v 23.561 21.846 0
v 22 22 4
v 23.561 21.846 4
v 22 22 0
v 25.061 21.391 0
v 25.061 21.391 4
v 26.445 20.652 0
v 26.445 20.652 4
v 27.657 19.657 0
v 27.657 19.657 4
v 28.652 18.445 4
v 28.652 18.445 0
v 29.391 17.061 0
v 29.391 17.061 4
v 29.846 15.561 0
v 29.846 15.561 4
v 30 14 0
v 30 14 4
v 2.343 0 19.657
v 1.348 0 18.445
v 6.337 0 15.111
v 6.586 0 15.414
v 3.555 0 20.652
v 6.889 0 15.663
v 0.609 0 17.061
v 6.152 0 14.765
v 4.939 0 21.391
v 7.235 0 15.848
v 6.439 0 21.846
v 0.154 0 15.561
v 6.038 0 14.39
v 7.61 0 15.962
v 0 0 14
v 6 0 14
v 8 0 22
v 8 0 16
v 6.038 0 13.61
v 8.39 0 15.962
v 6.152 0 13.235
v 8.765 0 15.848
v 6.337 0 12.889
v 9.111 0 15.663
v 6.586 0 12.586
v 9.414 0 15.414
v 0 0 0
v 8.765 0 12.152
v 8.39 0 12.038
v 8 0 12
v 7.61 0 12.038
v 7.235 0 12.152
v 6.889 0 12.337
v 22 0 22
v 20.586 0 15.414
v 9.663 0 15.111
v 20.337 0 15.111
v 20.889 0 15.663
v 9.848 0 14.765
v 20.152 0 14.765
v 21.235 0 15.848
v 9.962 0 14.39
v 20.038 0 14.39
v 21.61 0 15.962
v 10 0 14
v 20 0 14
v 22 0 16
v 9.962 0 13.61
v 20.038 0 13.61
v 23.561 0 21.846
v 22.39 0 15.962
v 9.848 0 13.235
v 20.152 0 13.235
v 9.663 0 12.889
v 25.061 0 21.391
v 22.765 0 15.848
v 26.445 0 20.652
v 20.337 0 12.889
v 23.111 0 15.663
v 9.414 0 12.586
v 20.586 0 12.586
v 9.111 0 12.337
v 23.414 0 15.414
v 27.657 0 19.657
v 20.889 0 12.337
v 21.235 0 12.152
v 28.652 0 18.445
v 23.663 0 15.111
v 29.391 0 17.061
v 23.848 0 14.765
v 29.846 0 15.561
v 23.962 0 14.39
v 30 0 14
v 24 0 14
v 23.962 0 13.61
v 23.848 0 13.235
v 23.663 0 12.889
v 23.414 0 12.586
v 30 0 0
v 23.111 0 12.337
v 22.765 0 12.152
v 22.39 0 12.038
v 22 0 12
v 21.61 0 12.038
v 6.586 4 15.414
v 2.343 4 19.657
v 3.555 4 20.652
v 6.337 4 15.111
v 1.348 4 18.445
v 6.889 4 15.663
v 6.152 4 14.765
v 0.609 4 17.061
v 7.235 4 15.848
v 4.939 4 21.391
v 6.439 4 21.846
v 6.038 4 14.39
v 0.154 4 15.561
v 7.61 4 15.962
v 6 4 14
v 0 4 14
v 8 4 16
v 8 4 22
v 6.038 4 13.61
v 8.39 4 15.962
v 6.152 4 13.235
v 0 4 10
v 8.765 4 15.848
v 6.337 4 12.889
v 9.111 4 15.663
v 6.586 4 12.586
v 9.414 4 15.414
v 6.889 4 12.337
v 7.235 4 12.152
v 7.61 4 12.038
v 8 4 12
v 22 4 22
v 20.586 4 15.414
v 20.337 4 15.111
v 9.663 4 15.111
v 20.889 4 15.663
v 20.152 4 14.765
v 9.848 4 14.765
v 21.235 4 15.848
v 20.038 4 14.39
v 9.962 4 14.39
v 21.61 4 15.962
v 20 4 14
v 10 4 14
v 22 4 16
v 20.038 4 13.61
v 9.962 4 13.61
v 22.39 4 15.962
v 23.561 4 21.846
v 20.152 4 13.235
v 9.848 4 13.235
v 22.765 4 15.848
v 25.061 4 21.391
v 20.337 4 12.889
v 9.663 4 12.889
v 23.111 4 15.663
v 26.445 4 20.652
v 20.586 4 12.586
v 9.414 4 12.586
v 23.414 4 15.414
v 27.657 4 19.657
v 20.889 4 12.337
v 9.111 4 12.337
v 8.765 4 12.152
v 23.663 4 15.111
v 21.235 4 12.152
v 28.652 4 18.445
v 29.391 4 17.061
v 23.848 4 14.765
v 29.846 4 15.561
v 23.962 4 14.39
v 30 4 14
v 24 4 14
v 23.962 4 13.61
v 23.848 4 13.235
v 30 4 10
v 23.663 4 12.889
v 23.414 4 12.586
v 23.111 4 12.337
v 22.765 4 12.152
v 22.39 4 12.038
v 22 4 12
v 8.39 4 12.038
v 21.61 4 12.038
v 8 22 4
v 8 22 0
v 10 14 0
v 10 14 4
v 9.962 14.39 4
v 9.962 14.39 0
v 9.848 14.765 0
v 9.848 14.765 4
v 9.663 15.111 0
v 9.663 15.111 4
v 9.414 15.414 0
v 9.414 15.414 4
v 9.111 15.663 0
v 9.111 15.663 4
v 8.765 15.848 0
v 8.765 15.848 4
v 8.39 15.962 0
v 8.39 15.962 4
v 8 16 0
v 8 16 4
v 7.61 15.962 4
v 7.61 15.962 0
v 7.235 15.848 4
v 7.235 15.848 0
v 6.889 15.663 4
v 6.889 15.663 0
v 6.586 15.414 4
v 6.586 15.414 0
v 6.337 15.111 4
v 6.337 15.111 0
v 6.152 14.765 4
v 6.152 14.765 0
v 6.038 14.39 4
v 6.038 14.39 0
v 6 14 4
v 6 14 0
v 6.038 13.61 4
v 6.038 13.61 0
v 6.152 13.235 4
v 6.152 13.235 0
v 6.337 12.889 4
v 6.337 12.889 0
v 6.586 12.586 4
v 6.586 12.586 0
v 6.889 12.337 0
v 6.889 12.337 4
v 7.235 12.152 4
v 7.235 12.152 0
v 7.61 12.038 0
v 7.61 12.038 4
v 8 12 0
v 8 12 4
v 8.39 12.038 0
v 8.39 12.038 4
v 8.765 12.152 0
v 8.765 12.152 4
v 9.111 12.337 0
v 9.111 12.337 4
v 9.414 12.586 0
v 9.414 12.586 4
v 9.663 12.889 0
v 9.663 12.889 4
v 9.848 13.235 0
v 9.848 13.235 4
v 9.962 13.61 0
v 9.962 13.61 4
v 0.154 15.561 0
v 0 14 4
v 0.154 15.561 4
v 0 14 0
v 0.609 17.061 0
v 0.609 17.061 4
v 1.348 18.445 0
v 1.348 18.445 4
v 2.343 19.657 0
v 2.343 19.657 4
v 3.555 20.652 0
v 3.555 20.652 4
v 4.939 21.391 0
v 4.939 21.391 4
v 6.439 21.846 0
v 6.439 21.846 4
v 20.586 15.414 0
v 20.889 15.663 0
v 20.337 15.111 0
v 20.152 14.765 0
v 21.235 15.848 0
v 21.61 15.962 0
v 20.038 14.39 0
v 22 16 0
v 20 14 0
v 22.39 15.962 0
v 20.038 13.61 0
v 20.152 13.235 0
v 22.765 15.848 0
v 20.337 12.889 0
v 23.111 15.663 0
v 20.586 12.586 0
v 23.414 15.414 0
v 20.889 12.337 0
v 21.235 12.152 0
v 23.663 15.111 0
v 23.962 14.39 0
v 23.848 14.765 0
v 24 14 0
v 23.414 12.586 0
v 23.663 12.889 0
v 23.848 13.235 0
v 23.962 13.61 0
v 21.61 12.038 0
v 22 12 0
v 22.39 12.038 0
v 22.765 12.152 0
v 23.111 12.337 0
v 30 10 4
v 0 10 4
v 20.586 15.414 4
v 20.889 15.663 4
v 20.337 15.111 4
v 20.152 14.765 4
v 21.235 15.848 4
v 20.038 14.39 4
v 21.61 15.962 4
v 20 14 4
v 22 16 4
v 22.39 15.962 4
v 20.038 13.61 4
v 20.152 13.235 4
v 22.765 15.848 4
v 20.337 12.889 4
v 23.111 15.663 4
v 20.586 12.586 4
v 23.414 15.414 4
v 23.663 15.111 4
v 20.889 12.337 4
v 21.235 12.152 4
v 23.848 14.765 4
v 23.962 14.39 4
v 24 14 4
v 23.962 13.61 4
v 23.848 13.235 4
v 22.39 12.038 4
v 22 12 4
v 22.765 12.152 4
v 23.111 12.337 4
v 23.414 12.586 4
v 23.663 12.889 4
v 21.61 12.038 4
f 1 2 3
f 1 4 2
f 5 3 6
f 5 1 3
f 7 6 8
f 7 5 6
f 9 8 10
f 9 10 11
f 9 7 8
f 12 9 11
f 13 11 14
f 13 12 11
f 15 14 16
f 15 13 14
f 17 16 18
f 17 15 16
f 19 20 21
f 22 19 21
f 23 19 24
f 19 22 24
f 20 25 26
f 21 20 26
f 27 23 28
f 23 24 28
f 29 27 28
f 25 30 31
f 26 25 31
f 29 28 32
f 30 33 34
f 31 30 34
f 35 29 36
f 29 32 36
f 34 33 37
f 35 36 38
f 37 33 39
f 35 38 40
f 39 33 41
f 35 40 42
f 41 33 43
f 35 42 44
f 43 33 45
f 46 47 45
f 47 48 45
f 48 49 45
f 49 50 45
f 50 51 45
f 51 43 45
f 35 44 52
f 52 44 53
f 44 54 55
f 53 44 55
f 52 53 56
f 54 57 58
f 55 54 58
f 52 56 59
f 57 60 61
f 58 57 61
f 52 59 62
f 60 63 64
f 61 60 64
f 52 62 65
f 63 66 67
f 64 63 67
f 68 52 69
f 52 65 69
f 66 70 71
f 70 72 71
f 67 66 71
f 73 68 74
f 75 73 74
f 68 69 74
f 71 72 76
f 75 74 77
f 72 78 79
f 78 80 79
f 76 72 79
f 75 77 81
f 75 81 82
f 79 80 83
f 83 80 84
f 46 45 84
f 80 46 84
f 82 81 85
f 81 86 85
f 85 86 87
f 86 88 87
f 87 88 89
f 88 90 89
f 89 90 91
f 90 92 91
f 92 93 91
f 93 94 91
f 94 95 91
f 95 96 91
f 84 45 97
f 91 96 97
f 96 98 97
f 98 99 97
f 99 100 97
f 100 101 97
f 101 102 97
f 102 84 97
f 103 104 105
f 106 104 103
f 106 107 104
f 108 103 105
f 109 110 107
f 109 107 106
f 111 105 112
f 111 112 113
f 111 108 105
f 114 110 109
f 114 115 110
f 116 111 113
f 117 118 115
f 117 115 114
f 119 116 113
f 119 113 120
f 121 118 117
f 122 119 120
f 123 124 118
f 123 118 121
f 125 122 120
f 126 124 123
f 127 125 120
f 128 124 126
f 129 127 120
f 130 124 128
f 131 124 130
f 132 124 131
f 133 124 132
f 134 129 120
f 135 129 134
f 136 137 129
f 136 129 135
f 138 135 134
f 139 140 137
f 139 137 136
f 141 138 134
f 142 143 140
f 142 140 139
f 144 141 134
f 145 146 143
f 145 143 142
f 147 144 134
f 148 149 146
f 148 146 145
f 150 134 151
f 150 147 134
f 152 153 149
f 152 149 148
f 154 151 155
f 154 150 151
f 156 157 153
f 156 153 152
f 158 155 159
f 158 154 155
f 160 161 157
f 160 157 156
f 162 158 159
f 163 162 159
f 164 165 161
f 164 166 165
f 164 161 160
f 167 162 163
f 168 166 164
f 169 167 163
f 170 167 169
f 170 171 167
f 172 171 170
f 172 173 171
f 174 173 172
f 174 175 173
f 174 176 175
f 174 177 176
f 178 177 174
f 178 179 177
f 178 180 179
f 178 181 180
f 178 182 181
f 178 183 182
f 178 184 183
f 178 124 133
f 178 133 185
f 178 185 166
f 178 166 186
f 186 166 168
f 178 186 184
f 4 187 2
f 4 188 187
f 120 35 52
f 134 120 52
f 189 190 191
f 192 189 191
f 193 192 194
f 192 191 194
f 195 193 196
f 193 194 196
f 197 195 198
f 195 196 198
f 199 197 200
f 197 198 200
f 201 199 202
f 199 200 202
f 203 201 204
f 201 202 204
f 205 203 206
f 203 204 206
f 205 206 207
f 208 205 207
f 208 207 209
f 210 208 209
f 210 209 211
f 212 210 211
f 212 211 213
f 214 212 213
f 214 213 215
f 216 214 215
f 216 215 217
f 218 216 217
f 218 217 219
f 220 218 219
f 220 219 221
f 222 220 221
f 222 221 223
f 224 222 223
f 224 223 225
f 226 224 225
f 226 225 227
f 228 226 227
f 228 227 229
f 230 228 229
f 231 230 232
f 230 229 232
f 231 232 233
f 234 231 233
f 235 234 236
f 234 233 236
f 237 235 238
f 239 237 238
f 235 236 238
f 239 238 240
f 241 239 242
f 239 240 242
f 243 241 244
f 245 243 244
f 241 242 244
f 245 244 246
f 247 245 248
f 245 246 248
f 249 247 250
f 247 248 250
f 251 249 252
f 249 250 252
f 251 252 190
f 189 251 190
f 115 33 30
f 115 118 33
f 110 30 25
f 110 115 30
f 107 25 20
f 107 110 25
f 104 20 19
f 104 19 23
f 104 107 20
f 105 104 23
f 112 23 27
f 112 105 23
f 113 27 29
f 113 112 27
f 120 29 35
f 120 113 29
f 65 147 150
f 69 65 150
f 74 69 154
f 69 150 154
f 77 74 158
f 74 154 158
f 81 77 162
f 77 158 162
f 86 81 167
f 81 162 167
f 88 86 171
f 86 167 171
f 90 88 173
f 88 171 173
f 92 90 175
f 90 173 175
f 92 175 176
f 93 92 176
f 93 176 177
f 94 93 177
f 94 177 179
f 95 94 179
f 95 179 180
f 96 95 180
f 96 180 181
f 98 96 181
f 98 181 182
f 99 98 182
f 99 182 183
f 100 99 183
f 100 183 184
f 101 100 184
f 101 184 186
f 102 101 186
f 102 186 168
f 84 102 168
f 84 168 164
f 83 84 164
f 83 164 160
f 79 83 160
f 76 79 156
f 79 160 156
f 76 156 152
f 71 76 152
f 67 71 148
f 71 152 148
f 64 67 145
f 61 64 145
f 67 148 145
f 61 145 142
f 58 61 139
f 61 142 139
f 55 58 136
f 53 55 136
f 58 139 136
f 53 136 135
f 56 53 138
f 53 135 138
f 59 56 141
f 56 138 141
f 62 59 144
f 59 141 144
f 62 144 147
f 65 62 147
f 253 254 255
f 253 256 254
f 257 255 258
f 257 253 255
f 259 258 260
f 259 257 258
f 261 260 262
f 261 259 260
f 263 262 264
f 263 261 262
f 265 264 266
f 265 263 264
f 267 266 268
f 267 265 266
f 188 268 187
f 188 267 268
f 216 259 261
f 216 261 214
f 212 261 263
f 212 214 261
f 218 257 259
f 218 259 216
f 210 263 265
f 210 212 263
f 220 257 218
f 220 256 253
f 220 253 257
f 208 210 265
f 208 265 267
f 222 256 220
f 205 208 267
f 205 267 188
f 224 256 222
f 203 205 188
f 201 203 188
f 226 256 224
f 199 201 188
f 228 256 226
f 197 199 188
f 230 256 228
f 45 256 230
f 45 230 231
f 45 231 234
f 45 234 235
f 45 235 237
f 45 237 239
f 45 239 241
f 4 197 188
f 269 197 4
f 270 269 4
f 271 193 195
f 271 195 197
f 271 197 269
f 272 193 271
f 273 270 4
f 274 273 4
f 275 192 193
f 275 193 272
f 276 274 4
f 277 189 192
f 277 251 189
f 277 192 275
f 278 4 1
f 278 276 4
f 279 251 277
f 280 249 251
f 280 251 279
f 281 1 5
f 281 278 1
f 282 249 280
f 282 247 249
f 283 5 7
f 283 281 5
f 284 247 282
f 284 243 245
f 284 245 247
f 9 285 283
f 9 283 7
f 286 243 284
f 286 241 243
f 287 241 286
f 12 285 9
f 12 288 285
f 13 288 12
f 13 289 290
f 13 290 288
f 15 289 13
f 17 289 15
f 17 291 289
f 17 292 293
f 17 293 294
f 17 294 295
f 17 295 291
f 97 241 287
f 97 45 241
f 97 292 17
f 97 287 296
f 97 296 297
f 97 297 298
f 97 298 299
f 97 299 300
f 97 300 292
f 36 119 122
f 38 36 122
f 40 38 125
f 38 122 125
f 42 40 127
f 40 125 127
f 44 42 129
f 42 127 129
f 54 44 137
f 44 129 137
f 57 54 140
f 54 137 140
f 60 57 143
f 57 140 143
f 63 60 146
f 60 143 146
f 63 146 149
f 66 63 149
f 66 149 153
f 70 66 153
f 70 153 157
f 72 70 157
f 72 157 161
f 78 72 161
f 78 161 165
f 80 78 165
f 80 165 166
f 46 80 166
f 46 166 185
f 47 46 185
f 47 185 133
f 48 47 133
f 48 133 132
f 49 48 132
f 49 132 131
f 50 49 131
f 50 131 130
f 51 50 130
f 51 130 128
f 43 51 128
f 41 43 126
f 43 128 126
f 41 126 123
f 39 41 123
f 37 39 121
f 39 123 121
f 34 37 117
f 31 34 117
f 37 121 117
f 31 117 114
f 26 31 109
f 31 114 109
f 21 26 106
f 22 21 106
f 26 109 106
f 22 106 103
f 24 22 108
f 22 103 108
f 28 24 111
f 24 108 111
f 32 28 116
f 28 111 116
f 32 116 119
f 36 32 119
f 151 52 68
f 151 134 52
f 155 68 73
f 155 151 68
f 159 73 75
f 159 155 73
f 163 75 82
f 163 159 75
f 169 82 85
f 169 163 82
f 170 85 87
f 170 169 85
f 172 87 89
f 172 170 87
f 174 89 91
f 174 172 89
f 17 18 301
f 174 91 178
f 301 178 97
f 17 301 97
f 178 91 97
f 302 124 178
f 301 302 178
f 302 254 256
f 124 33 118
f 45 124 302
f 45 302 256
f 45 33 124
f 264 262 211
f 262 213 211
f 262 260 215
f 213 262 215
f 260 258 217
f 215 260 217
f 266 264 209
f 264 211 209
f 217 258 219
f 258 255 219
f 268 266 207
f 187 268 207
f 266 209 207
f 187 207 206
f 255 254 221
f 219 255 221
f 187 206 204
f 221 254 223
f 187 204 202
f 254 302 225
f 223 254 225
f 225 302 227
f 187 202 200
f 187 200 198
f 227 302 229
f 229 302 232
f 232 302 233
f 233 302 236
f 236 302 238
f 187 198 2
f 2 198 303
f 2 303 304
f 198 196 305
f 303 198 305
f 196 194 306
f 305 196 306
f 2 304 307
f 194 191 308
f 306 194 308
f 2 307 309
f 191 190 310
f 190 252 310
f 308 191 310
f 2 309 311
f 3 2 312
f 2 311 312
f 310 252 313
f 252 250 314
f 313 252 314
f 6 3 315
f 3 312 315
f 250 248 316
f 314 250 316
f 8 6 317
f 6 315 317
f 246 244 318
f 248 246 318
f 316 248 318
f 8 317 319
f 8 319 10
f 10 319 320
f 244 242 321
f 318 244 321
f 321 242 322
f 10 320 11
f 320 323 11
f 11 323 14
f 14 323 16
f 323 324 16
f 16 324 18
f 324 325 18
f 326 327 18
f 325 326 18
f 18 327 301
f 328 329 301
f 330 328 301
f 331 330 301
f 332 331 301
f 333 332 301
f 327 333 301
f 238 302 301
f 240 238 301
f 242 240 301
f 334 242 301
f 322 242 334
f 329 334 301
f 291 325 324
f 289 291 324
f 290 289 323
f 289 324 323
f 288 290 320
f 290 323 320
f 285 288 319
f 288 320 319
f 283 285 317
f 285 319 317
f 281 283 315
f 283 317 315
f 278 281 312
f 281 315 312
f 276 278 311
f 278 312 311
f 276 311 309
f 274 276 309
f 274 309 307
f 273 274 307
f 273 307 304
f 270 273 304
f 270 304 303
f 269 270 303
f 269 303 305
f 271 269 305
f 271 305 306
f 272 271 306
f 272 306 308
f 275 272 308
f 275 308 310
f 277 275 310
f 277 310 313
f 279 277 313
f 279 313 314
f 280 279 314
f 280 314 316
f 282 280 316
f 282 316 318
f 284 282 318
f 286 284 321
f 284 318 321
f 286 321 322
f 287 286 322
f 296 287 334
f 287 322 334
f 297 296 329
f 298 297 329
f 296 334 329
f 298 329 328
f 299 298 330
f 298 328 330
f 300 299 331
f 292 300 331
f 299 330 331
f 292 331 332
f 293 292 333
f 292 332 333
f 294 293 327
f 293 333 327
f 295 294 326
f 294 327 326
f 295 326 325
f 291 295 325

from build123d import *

# Parameters (mm, degrees)
SKETCH_1_W          = 30
SKETCH_1_H          = 22
EXTRUDE_1_DEPTH     = 4
SKETCH_2_W          = 30
SKETCH_2_H          = 4
EXTRUDE_2_DEPTH     = 18
SKETCH_3_R          = 2
CUT_EXTRUDE_1_DEPTH = 20
SKETCH_4_R          = 2
CUT_EXTRUDE_2_DEPTH = 20
CHAMFER_1_SIZE      = 6
FILLET_1_R          = 8


with BuildPart() as part:
    # 草图1 → 凸台-拉伸1 (new body)
    with BuildSketch(Plane(origin=(0, 0, 0), x_dir=(1, 0, 0), z_dir=(0, 1, 0))):
        with Locations((15, -11)):
            Rectangle(SKETCH_1_W, SKETCH_1_H)
    extrude(amount=EXTRUDE_1_DEPTH)

    # 草图2 → 凸台-拉伸2 (add)
    with BuildSketch(Plane(origin=(0, 4, 0), x_dir=(1, 0, 0), z_dir=(0, 1, 0))):
        with Locations((15, -2)):
            Rectangle(SKETCH_2_W, SKETCH_2_H)
    extrude(amount=EXTRUDE_2_DEPTH)

    # 草图3 → 切除-拉伸1 (cut)
    with BuildSketch(Plane(origin=(0, 4, 0), x_dir=(1, 0, 0), z_dir=(0, 1, 0))):
        with Locations(Location((8, -14, 0), (0, 0, 270))):
            Circle(SKETCH_3_R)
        with Locations(Location((22, -14, 0), (0, 0, 270))):
            Circle(SKETCH_3_R)
    extrude(amount=-CUT_EXTRUDE_1_DEPTH, mode=Mode.SUBTRACT)

    # 草图4 → 切除-拉伸2 (cut)
    with BuildSketch(Plane.XY.offset(4)):
        with Locations((8, 14)):
            Circle(SKETCH_4_R)
        with Locations((22, 14)):
            Circle(SKETCH_4_R)
    extrude(amount=-CUT_EXTRUDE_2_DEPTH, mode=Mode.SUBTRACT)

    # 倒角1
    chamfer_1_edges = [part.edges().sort_by_distance(p)[0] for p in [
        (15, 4, 4),
    ]]
    chamfer(chamfer_1_edges, length=CHAMFER_1_SIZE)

    # 圆角1
    fillet_1_edges = [part.edges().sort_by_distance(p)[0] for p in [
        (0, 22, 2),
        (30, 22, 2),
        (30, 2, 22),
        (0, 2, 22),
    ]]
    fillet(fillet_1_edges, radius=FILLET_1_R)


solid = part.part
